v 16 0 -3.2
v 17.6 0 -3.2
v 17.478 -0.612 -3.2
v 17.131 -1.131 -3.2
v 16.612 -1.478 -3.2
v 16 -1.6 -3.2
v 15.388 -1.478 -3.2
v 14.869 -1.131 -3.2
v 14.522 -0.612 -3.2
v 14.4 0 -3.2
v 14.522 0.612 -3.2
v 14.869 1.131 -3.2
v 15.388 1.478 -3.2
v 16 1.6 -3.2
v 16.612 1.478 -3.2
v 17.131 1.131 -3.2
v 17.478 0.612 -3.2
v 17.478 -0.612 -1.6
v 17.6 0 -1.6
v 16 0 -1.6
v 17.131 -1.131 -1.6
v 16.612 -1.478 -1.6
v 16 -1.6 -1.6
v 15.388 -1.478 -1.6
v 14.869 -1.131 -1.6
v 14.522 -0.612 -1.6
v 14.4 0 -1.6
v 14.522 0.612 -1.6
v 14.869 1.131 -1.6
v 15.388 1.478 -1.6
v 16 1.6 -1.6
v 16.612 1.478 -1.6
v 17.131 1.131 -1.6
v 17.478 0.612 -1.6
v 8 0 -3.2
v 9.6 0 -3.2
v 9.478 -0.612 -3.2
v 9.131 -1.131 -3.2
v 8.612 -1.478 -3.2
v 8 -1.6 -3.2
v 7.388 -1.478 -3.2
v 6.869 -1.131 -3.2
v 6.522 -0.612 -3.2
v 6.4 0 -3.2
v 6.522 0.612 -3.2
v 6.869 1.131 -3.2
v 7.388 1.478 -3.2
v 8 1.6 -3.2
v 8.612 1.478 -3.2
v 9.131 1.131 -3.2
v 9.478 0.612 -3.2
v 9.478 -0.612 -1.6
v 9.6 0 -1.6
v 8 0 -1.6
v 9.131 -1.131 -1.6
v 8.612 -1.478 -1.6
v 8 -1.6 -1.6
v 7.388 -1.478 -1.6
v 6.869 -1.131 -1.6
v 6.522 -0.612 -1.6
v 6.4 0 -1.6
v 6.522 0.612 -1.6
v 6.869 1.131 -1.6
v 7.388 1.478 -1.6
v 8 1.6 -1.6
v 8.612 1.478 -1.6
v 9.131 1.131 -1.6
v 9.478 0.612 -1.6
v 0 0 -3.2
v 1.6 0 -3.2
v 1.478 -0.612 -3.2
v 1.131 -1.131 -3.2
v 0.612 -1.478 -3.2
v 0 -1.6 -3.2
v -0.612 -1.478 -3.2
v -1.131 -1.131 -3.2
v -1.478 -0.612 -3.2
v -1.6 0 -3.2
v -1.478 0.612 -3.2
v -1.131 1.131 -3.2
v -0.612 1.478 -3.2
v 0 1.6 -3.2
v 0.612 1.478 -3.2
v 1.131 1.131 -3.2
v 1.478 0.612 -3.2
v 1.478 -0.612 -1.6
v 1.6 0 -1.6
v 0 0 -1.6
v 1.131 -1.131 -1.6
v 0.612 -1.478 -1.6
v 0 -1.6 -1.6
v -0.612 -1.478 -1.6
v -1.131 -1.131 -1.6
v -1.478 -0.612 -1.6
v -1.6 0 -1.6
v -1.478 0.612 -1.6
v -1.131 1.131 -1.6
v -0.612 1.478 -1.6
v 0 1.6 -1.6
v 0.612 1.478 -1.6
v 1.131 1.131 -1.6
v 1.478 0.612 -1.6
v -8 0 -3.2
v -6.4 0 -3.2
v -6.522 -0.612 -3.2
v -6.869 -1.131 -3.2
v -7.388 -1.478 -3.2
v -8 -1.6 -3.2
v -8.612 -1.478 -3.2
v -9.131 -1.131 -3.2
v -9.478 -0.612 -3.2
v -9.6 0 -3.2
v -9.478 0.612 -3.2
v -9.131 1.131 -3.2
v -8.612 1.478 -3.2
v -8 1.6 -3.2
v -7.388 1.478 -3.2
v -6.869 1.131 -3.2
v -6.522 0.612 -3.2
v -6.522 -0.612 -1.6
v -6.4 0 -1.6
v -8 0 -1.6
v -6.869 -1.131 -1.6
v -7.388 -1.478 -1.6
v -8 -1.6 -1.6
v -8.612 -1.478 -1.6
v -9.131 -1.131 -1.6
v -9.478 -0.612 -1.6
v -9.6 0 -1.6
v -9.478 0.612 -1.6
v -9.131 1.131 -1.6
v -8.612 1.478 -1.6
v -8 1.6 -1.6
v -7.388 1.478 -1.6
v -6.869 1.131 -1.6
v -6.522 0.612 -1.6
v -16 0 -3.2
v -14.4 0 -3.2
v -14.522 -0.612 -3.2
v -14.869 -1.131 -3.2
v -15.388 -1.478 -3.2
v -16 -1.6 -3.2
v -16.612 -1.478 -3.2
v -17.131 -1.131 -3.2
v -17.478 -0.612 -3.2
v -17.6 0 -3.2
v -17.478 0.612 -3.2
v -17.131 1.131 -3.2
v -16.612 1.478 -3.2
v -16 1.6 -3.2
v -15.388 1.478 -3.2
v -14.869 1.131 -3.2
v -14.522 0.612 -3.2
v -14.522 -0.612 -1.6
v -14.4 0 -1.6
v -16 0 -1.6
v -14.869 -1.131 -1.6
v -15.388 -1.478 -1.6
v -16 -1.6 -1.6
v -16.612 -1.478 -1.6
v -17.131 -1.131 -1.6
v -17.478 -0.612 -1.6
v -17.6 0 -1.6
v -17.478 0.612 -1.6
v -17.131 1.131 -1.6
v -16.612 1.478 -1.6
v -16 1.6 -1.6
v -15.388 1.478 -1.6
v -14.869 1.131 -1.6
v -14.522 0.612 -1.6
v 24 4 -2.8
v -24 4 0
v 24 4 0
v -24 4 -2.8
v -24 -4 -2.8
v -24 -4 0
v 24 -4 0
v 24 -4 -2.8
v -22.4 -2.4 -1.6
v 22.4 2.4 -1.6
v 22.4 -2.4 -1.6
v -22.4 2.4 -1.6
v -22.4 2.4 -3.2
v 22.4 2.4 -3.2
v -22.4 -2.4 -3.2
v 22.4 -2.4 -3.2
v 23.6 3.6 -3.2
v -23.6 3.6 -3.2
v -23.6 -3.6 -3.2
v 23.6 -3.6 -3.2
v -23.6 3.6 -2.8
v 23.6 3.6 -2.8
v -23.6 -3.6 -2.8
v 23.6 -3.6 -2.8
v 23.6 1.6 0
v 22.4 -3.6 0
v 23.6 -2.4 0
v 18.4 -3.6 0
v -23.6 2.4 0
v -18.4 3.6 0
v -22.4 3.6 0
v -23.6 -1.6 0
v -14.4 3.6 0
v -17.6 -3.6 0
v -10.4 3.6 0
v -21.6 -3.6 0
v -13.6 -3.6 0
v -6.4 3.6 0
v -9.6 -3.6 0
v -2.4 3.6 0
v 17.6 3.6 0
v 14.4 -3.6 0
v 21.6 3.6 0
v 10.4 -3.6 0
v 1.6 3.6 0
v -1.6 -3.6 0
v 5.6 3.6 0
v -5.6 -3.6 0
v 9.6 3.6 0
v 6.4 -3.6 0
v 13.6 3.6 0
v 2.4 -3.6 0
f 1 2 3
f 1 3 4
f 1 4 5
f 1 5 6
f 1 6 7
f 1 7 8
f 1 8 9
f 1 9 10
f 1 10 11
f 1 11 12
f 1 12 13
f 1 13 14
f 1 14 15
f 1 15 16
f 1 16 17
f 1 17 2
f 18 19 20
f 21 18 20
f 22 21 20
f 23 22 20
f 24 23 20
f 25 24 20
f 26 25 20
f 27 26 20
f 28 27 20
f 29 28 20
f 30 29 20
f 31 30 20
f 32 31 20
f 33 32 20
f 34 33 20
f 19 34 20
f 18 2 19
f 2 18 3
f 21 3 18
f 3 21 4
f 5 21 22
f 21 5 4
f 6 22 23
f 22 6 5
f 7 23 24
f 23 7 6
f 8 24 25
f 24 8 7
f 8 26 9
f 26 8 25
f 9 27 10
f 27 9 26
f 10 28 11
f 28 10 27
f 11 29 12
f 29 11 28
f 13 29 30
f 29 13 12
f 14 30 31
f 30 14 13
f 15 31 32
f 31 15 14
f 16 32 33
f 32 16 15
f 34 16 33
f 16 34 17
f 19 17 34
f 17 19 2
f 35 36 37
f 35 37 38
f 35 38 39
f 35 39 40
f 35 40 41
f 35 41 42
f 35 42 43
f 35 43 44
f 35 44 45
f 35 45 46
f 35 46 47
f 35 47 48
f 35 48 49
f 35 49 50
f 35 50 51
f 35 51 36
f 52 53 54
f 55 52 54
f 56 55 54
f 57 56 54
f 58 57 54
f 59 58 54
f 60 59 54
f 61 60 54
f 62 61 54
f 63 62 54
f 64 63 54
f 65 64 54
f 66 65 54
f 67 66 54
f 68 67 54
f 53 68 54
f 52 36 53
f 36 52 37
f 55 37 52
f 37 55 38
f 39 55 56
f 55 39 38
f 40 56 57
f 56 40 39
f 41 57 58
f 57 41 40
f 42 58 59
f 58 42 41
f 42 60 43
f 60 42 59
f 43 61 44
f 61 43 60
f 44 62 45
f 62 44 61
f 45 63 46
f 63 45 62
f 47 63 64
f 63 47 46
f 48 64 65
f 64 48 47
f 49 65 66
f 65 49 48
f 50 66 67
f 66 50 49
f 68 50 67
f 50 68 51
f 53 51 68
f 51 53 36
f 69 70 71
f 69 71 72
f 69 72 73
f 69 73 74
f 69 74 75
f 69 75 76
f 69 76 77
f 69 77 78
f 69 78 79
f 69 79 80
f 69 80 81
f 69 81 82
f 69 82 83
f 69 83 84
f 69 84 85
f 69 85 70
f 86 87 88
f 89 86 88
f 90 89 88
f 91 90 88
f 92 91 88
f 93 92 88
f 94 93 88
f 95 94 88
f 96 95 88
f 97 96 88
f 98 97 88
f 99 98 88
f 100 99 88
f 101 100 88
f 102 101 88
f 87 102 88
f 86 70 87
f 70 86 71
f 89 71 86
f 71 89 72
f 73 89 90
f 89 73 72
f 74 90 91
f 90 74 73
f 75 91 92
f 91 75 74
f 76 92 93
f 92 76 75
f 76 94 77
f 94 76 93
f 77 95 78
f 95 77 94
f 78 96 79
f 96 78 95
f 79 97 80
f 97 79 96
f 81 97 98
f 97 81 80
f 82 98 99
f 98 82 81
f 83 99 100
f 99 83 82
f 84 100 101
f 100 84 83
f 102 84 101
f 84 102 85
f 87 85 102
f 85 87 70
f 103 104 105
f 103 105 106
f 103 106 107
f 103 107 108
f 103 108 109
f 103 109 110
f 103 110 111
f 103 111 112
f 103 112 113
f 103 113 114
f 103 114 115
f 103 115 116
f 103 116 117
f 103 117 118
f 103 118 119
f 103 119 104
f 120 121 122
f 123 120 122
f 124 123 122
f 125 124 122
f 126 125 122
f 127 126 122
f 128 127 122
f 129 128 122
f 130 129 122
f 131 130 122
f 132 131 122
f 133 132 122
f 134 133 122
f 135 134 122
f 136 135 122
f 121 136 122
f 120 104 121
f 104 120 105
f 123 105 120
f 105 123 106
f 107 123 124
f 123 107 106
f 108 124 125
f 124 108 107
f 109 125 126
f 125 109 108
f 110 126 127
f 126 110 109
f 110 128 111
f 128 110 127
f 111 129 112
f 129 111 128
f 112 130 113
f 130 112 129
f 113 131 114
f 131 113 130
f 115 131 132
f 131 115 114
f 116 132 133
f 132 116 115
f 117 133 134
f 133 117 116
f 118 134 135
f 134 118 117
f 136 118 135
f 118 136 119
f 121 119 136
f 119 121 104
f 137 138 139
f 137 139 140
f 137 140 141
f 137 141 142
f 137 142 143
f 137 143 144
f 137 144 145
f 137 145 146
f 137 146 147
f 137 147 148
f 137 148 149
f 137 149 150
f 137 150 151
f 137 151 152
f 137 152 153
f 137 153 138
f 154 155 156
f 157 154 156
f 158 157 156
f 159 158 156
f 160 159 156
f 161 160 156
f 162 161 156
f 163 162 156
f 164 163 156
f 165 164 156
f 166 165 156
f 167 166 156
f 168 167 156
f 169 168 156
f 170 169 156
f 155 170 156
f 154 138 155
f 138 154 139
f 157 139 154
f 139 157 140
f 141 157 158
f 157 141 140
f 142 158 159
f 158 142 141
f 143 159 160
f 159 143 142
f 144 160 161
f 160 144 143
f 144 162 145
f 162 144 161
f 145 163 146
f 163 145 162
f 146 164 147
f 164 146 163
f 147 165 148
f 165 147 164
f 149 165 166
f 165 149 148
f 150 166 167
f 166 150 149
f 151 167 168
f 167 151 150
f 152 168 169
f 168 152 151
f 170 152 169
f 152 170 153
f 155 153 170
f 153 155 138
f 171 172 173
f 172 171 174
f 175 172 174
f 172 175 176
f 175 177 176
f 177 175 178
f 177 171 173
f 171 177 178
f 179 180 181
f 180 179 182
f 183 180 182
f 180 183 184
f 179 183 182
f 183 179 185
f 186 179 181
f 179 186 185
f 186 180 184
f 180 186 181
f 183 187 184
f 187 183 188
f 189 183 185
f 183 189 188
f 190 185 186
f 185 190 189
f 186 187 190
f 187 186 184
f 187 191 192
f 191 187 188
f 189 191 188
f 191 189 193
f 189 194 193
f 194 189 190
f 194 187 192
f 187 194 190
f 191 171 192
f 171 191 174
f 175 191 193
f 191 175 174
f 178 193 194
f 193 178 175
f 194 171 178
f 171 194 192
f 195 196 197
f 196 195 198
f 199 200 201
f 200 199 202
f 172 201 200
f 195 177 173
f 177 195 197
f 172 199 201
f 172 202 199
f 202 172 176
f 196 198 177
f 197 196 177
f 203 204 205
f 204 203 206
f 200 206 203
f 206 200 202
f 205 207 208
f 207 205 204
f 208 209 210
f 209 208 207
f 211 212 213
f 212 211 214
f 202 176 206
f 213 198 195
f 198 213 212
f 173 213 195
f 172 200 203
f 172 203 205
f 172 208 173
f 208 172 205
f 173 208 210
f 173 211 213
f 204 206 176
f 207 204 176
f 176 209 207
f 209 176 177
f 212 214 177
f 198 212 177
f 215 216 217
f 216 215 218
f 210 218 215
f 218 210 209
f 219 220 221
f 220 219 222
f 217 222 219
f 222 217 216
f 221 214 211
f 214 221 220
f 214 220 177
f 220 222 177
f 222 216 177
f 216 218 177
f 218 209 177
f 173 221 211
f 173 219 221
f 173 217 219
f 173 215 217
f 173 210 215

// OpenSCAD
// file: ../p/4-4edge.scad
use <../lib.scad>
function ldraw_lib__4_4edge() = [
// 0 Circle 1.0
// 0 Name: 4-4edge.dat
// 0 Author: James Jessiman
// 0 !LDRAW_ORG Primitive UPDATE 2017-01
// 0 !LICENSE Licensed under CC BY 2.0 and CC BY 4.0 : see CAreadme.txt
// 
// 0 BFC CERTIFY CCW
  [0,"BFC","CERTIFY"],
  [0,"BFC","CCW"],
// 
// 0 !HISTORY 1998-12-15 [PTadmin] Official Update 1998-10
// 0 !HISTORY 2005-12-28 [PTadmin] Official Update 2005-01
// 0 !HISTORY 2007-06-24 [PTadmin] Header formatted for Contributor Agreement
// 0 !HISTORY 2008-07-01 [PTadmin] Official Update 2008-01
// 0 !HISTORY 2017-01-15 [Steffen] BFCed
// 0 !HISTORY 2017-12-30 [PTadmin] Official Update 2017-01
// 
// 
// 2 24 1 0 0 0.9239 0 0.3827
  [2,24,1,0,0,0.9239,0,0.3827],
// 2 24 0.9239 0 0.3827 0.7071 0 0.7071
  [2,24,0.9239,0,0.3827,0.7071,0,0.7071],
// 2 24 0.7071 0 0.7071 0.3827 0 0.9239
  [2,24,0.7071,0,0.7071,0.3827,0,0.9239],
// 2 24 0.3827 0 0.9239 0 0 1
  [2,24,0.3827,0,0.9239,0,0,1],
// 2 24 0 0 1 -0.3827 0 0.9239
  [2,24,0,0,1,-0.3827,0,0.9239],
// 2 24 -0.3827 0 0.9239 -0.7071 0 0.7071
  [2,24,-0.3827,0,0.9239,-0.7071,0,0.7071],
// 2 24 -0.7071 0 0.7071 -0.9239 0 0.3827
  [2,24,-0.7071,0,0.7071,-0.9239,0,0.3827],
// 2 24 -0.9239 0 0.3827 -1 0 -0
  [2,24,-0.9239,0,0.3827,-1,0,-0],
// 2 24 -1 0 -0 -0.9239 0 -0.3827
  [2,24,-1,0,-0,-0.9239,0,-0.3827],
// 2 24 -0.9239 0 -0.3827 -0.7071 0 -0.7071
  [2,24,-0.9239,0,-0.3827,-0.7071,0,-0.7071],
// 2 24 -0.7071 0 -0.7071 -0.3827 0 -0.9239
  [2,24,-0.7071,0,-0.7071,-0.3827,0,-0.9239],
// 2 24 -0.3827 0 -0.9239 0 0 -1
  [2,24,-0.3827,0,-0.9239,0,0,-1],
// 2 24 0 0 -1 0.3827 0 -0.9239
  [2,24,0,0,-1,0.3827,0,-0.9239],
// 2 24 0.3827 0 -0.9239 0.7071 0 -0.7071
  [2,24,0.3827,0,-0.9239,0.7071,0,-0.7071],
// 2 24 0.7071 0 -0.7071 0.9239 0 -0.3827
  [2,24,0.7071,0,-0.7071,0.9239,0,-0.3827],
// 2 24 0.9239 0 -0.3827 1 0 0
  [2,24,0.9239,0,-0.3827,1,0,0],
];
module ldraw_lib__4_4edge(step=0, col=false, unit=2/5, alt=false, line=0.2, solid=!$preview)
    makepoly(ldraw_lib__4_4edge(), step=step, col=col, unit=unit, alt=alt, line=line, solid=solid);
ldraw_lib__4_4edge(line=0.2);
// file: ../p/4-4disc.scad
use <../lib.scad>
function ldraw_lib__4_4disc() = [
// 0 Disc 1.0
// 0 Name: 4-4disc.dat
// 0 Author: James Jessiman
// 0 !LDRAW_ORG Primitive UPDATE 2002-02
// 0 !LICENSE Licensed under CC BY 2.0 and CC BY 4.0 : see CAreadme.txt
// 
// 0 BFC CERTIFY CCW
  [0,"BFC","CERTIFY"],
  [0,"BFC","CCW"],
// 
// 0 !HISTORY 1998-12-15 [PTadmin] Official Update 1998-10
// 0 !HISTORY 2002-03-23 [sbliss] Added BFC statement
// 0 !HISTORY 2002-04-25 [PTadmin] Official Update 2002-02
// 0 !HISTORY 2007-06-24 [PTadmin] Header formatted for Contributor Agreement
// 0 !HISTORY 2008-07-01 [PTadmin] Official Update 2008-01
// 
// 
// 3 16 0 0 0 1 0 0 0.9239 0 0.3827
  [3,16,0,0,0,1,0,0,0.9239,0,0.3827],
// 3 16 0 0 0 0.9239 0 0.3827 0.7071 0 0.7071
  [3,16,0,0,0,0.9239,0,0.3827,0.7071,0,0.7071],
// 3 16 0 0 0 0.7071 0 0.7071 0.3827 0 0.9239
  [3,16,0,0,0,0.7071,0,0.7071,0.3827,0,0.9239],
// 3 16 0 0 0 0.3827 0 0.9239 0 0 1
  [3,16,0,0,0,0.3827,0,0.9239,0,0,1],
// 3 16 0 0 0 0 0 1 -0.3827 0 0.9239
  [3,16,0,0,0,0,0,1,-0.3827,0,0.9239],
// 3 16 0 0 0 -0.3827 0 0.9239 -0.7071 0 0.7071
  [3,16,0,0,0,-0.3827,0,0.9239,-0.7071,0,0.7071],
// 3 16 0 0 0 -0.7071 0 0.7071 -0.9239 0 0.3827
  [3,16,0,0,0,-0.7071,0,0.7071,-0.9239,0,0.3827],
// 3 16 0 0 0 -0.9239 0 0.3827 -1 0 -0
  [3,16,0,0,0,-0.9239,0,0.3827,-1,0,-0],
// 3 16 0 0 0 -1 0 -0 -0.9239 0 -0.3827
  [3,16,0,0,0,-1,0,-0,-0.9239,0,-0.3827],
// 3 16 0 0 0 -0.9239 0 -0.3827 -0.7071 0 -0.7071
  [3,16,0,0,0,-0.9239,0,-0.3827,-0.7071,0,-0.7071],
// 3 16 0 0 0 -0.7071 0 -0.7071 -0.3827 0 -0.9239
  [3,16,0,0,0,-0.7071,0,-0.7071,-0.3827,0,-0.9239],
// 3 16 0 0 0 -0.3827 0 -0.9239 0 0 -1
  [3,16,0,0,0,-0.3827,0,-0.9239,0,0,-1],
// 3 16 0 0 0 0 0 -1 0.3827 0 -0.9239
  [3,16,0,0,0,0,0,-1,0.3827,0,-0.9239],
// 3 16 0 0 0 0.3827 0 -0.9239 0.7071 0 -0.7071
  [3,16,0,0,0,0.3827,0,-0.9239,0.7071,0,-0.7071],
// 3 16 0 0 0 0.7071 0 -0.7071 0.9239 0 -0.3827
  [3,16,0,0,0,0.7071,0,-0.7071,0.9239,0,-0.3827],
// 3 16 0 0 0 0.9239 0 -0.3827 1 0 0
  [3,16,0,0,0,0.9239,0,-0.3827,1,0,0],
// 0
];
module ldraw_lib__4_4disc(step=0, col=false, unit=2/5, alt=false, line=0.2, solid=!$preview)
    makepoly(ldraw_lib__4_4disc(), step=step, col=col, unit=unit, alt=alt, line=line, solid=solid);
ldraw_lib__4_4disc(line=0.2);
// file: ../p/4-4cyli.scad
use <../lib.scad>
$fa=1; $fs=0.2;
function ldraw_lib__4_4cyli(realsolid=false) = [
// 0 Cylinder 1.0
// 0 Name: 4-4cyli.dat
// 0 Author: James Jessiman
// 0 !LDRAW_ORG Primitive UPDATE 2005-01
// 0 !LICENSE Licensed under CC BY 2.0 and CC BY 4.0 : see CAreadme.txt
// 
// 0 BFC CERTIFY CCW
  [0,"BFC","CERTIFY"],
  [0,"BFC","CCW"],
// 
// 0 !HISTORY 1998-12-15 [PTadmin] Official Update 1998-10
// 0 !HISTORY 2002-03-23 [sbliss] Added BFC statement; merged headers from files in distributions LDraw 0.27 and Complete.
// 0 !HISTORY 2002-04-25 [PTadmin] Official Update 2002-02
// 0 !HISTORY 2004-12-14 [guyvivan] BFC CCW
// 0 !HISTORY 2005-12-28 [PTadmin] Official Update 2005-01
// 0 !HISTORY 2007-06-24 [PTadmin] Header formatted for Contributor Agreement
// 0 !HISTORY 2008-07-01 [PTadmin] Official Update 2008-01
// 
// 
// 4 16 1 1 0 0.9239 1 0.3827 0.9239 0 0.3827 1 0 0
  [4,16,1,1,0,0.9239,1,0.3827,0.9239,0,0.3827,1,0,0],
// 5 24 1 0 0 1 1 0 0.9239 0 0.3827 0.9239 0 -0.3827
  [5,24,1,0,0,1,1,0,0.9239,0,0.3827,0.9239,0,-0.3827],
// 4 16 0.9239 1 0.3827 0.7071 1 0.7071 0.7071 0 0.7071 0.9239 0 0.3827
  [4,16,0.9239,1,0.3827,0.7071,1,0.7071,0.7071,0,0.7071,0.9239,0,0.3827],
// 5 24 0.9239 0 0.3827 0.9239 1 0.3827 0.7071 0 0.7071 1 0 0
  [5,24,0.9239,0,0.3827,0.9239,1,0.3827,0.7071,0,0.7071,1,0,0],
// 4 16 0.7071 1 0.7071 0.3827 1 0.9239 0.3827 0 0.9239 0.7071 0 0.7071
  [4,16,0.7071,1,0.7071,0.3827,1,0.9239,0.3827,0,0.9239,0.7071,0,0.7071],
// 5 24 0.7071 0 0.7071 0.7071 1 0.7071 0.3827 0 0.9239 0.9239 0 0.3827
  [5,24,0.7071,0,0.7071,0.7071,1,0.7071,0.3827,0,0.9239,0.9239,0,0.3827],
// 4 16 0.3827 1 0.9239 0 1 1 0 0 1 0.3827 0 0.9239
  [4,16,0.3827,1,0.9239,0,1,1,0,0,1,0.3827,0,0.9239],
// 5 24 0.3827 0 0.9239 0.3827 1 0.9239 0 0 1 0.7071 0 0.7071
  [5,24,0.3827,0,0.9239,0.3827,1,0.9239,0,0,1,0.7071,0,0.7071],
// 4 16 0 1 1 -0.3827 1 0.9239 -0.3827 0 0.9239 0 0 1
  [4,16,0,1,1,-0.3827,1,0.9239,-0.3827,0,0.9239,0,0,1],
// 5 24 0 0 1 0 1 1 -0.3827 0 0.9239 0.3827 0 0.9239
  [5,24,0,0,1,0,1,1,-0.3827,0,0.9239,0.3827,0,0.9239],
// 4 16 -0.3827 1 0.9239 -0.7071 1 0.7071 -0.7071 0 0.7071 -0.3827 0 0.9239
  [4,16,-0.3827,1,0.9239,-0.7071,1,0.7071,-0.7071,0,0.7071,-0.3827,0,0.9239],
// 5 24 -0.3827 0 0.9239 -0.3827 1 0.9239 -0.7071 0 0.7071 0 0 1
  [5,24,-0.3827,0,0.9239,-0.3827,1,0.9239,-0.7071,0,0.7071,0,0,1],
// 4 16 -0.7071 1 0.7071 -0.9239 1 0.3827 -0.9239 0 0.3827 -0.7071 0 0.7071
  [4,16,-0.7071,1,0.7071,-0.9239,1,0.3827,-0.9239,0,0.3827,-0.7071,0,0.7071],
// 5 24 -0.7071 0 0.7071 -0.7071 1 0.7071 -0.9239 0 0.3827 -0.3827 0 0.9239
  [5,24,-0.7071,0,0.7071,-0.7071,1,0.7071,-0.9239,0,0.3827,-0.3827,0,0.9239],
// 4 16 -0.9239 1 0.3827 -1 1 0 -1 0 0 -0.9239 0 0.3827
  [4,16,-0.9239,1,0.3827,-1,1,0,-1,0,0,-0.9239,0,0.3827],
// 5 24 -0.9239 0 0.3827 -0.9239 1 0.3827 -1 0 0 -0.7071 0 0.7071
  [5,24,-0.9239,0,0.3827,-0.9239,1,0.3827,-1,0,0,-0.7071,0,0.7071],
// 4 16 -1 1 0 -0.9239 1 -0.3827 -0.9239 0 -0.3827 -1 0 0
  [4,16,-1,1,0,-0.9239,1,-0.3827,-0.9239,0,-0.3827,-1,0,0],
// 5 24 -1 0 0 -1 1 0 -0.9239 0 -0.3827 -0.9239 0 0.3827
  [5,24,-1,0,0,-1,1,0,-0.9239,0,-0.3827,-0.9239,0,0.3827],
// 4 16 -0.9239 1 -0.3827 -0.7071 1 -0.7071 -0.7071 0 -0.7071 -0.9239 0 -0.3827
  [4,16,-0.9239,1,-0.3827,-0.7071,1,-0.7071,-0.7071,0,-0.7071,-0.9239,0,-0.3827],
// 5 24 -0.9239 0 -0.3827 -0.9239 1 -0.3827 -0.7071 0 -0.7071 -1 0 0
  [5,24,-0.9239,0,-0.3827,-0.9239,1,-0.3827,-0.7071,0,-0.7071,-1,0,0],
// 4 16 -0.7071 1 -0.7071 -0.3827 1 -0.9239 -0.3827 0 -0.9239 -0.7071 0 -0.7071
  [4,16,-0.7071,1,-0.7071,-0.3827,1,-0.9239,-0.3827,0,-0.9239,-0.7071,0,-0.7071],
// 5 24 -0.7071 0 -0.7071 -0.7071 1 -0.7071 -0.3827 0 -0.9239 -0.9239 0 -0.3827
  [5,24,-0.7071,0,-0.7071,-0.7071,1,-0.7071,-0.3827,0,-0.9239,-0.9239,0,-0.3827],
// 4 16 -0.3827 1 -0.9239 0 1 -1 0 0 -1 -0.3827 0 -0.9239
  [4,16,-0.3827,1,-0.9239,0,1,-1,0,0,-1,-0.3827,0,-0.9239],
// 5 24 -0.3827 0 -0.9239 -0.3827 1 -0.9239 0 0 -1 -0.7071 0 -0.7071
  [5,24,-0.3827,0,-0.9239,-0.3827,1,-0.9239,0,0,-1,-0.7071,0,-0.7071],
// 4 16 0 1 -1 0.3827 1 -0.9239 0.3827 0 -0.9239 0 0 -1
  [4,16,0,1,-1,0.3827,1,-0.9239,0.3827,0,-0.9239,0,0,-1],
// 5 24 0 0 -1 0 1 -1 0.3827 0 -0.9239 -0.3827 0 -0.9239
  [5,24,0,0,-1,0,1,-1,0.3827,0,-0.9239,-0.3827,0,-0.9239],
// 4 16 0.3827 1 -0.9239 0.7071 1 -0.7071 0.7071 0 -0.7071 0.3827 0 -0.9239
  [4,16,0.3827,1,-0.9239,0.7071,1,-0.7071,0.7071,0,-0.7071,0.3827,0,-0.9239],
// 5 24 0.3827 0 -0.9239 0.3827 1 -0.9239 0.7071 0 -0.7071 0 0 -1
  [5,24,0.3827,0,-0.9239,0.3827,1,-0.9239,0.7071,0,-0.7071,0,0,-1],
// 4 16 0.7071 1 -0.7071 0.9239 1 -0.3827 0.9239 0 -0.3827 0.7071 0 -0.7071
  [4,16,0.7071,1,-0.7071,0.9239,1,-0.3827,0.9239,0,-0.3827,0.7071,0,-0.7071],
// 5 24 0.7071 0 -0.7071 0.7071 1 -0.7071 0.9239 0 -0.3827 0.3827 0 -0.9239
  [5,24,0.7071,0,-0.7071,0.7071,1,-0.7071,0.9239,0,-0.3827,0.3827,0,-0.9239],
// 4 16 0.9239 1 -0.3827 1 1 0 1 0 0 0.9239 0 -0.3827
  [4,16,0.9239,1,-0.3827,1,1,0,1,0,0,0.9239,0,-0.3827],
// 5 24 0.9239 0 -0.3827 0.9239 1 -0.3827 1 0 0 0.7071 0 -0.7071
  [5,24,0.9239,0,-0.3827,0.9239,1,-0.3827,1,0,0,0.7071,0,-0.7071],
// 0
];
module ldraw_lib__4_4cyli(step=0, col=false, unit=2/5, alt=false, line=0.2, solid=!$preview)
    makepoly(ldraw_lib__4_4cyli(solid), step=step, col=col, unit=unit, alt=alt, line=line, solid=solid);
ldraw_lib__4_4cyli(line=0.2);
// file: ../p/stud3.scad
use <../lib.scad>
use <4-4cyli.scad>
use <4-4disc.scad>
use <4-4edge.scad>
function ldraw_lib__stud3() = [
// 0 Stud Tube Solid
// 0 Name: stud3.dat
// 0 Author: James Jessiman
// 0 !LDRAW_ORG Primitive UPDATE 2012-01
// 0 !LICENSE Licensed under CC BY 4.0 : see CAreadme.txt
// 
// 0 BFC CERTIFY CCW
  [0,"BFC","CERTIFY"],
  [0,"BFC","CCW"],
// 
// 0 !HISTORY 2002-04-04 [sbliss] Modified for BFC compliance
// 0 !HISTORY 2002-04-25 [PTadmin] Official Update 2002-02
// 0 !HISTORY 2007-06-24 [PTadmin] Header formatted for Contributor Agreement
// 0 !HISTORY 2008-07-01 [PTadmin] Official Update 2008-01
// 0 !HISTORY 2012-02-16 [Philo] Changed to CCW
// 0 !HISTORY 2012-03-30 [PTadmin] Official Update 2012-01
// 
// 
// 1 16 0 -4 0 4 0 0 0 1 0 0 0 4 4-4edge.dat
  [1,16,0,-4,0,4,0,0,0,1,0,0,0,4, ldraw_lib__4_4edge()],
// 1 16 0 0 0 4 0 0 0 1 0 0 0 4 4-4edge.dat
  [1,16,0,0,0,4,0,0,0,1,0,0,0,4, ldraw_lib__4_4edge()],
// 1 16 0 -4 0 4 0 0 0 1 0 0 0 4 4-4disc.dat
  [1,16,0,-4,0,4,0,0,0,1,0,0,0,4, ldraw_lib__4_4disc()],
  [-1,16,0,0,0,4,0,0,0,-1,0,0,0,4, ldraw_lib__4_4disc()],
// 1 16 0 -4 0 4 0 0 0 4 0 0 0 4 4-4cyli.dat
  [1,16,0,-4,0,4,0,0,0,4,0,0,0,4, ldraw_lib__4_4cyli()],
];
module ldraw_lib__stud3(step=0, col=false, unit=2/5, alt=false, line=0.2, solid=!$preview)
    makepoly(ldraw_lib__stud3(), step=step, col=col, unit=unit, alt=alt, line=line, solid=solid);
ldraw_lib__stud3(line=0.2);
// file: ../p/box5.scad
use <../lib.scad>
function ldraw_lib__box5() = [
// 0 Box with 5 Faces and All Edges
// 0 Name: box5.dat
// 0 Author: James Jessiman
// 0 !LDRAW_ORG Primitive UPDATE 2012-01
// 0 !LICENSE Licensed under CC BY 2.0 and CC BY 4.0 : see CAreadme.txt
// 
// 0 BFC CERTIFY CCW
  [0,"BFC","CERTIFY"],
  [0,"BFC","CCW"],
// 
// 0 !HISTORY 2002-04-03 [sbliss] Modified for BFC compliance
// 0 !HISTORY 2002-04-25 [PTadmin] Official Update 2002-02
// 0 !HISTORY 2007-06-24 [PTadmin] Header formatted for Contributor Agreement
// 0 !HISTORY 2008-07-01 [PTadmin] Official Update 2008-01
// 0 !HISTORY 2012-02-16 [Philo] Changed to CCW
// 0 !HISTORY 2012-03-30 [PTadmin] Official Update 2012-01
// 
// 
// 2 24 1 1 1 -1 1 1
  [2,24,1,1,1,-1,1,1],
// 2 24 -1 1 1 -1 1 -1
  [2,24,-1,1,1,-1,1,-1],
// 2 24 -1 1 -1 1 1 -1
  [2,24,-1,1,-1,1,1,-1],
// 2 24 1 1 -1 1 1 1
  [2,24,1,1,-1,1,1,1],
// 2 24 1 0 1 -1 0 1
  [2,24,1,0,1,-1,0,1],
// 2 24 -1 0 1 -1 0 -1
  [2,24,-1,0,1,-1,0,-1],
// 2 24 -1 0 -1 1 0 -1
  [2,24,-1,0,-1,1,0,-1],
// 2 24 1 0 -1 1 0 1
  [2,24,1,0,-1,1,0,1],
// 2 24 1 0 1 1 1 1
  [2,24,1,0,1,1,1,1],
// 2 24 -1 0 1 -1 1 1
  [2,24,-1,0,1,-1,1,1],
// 2 24 1 0 -1 1 1 -1
  [2,24,1,0,-1,1,1,-1],
// 2 24 -1 0 -1 -1 1 -1
  [2,24,-1,0,-1,-1,1,-1],
// 4 16 -1 1 1 1 1 1 1 1 -1 -1 1 -1
  [4,16,-1,1,1,1,1,1,1,1,-1,-1,1,-1],
// 4 16 -1 1 1 -1 0 1 1 0 1 1 1 1
  [4,16,-1,1,1,-1,0,1,1,0,1,1,1,1],
// 4 16 -1 1 -1 -1 0 -1 -1 0 1 -1 1 1
  [4,16,-1,1,-1,-1,0,-1,-1,0,1,-1,1,1],
// 4 16 1 1 -1 1 0 -1 -1 0 -1 -1 1 -1
  [4,16,1,1,-1,1,0,-1,-1,0,-1,-1,1,-1],
// 4 16 1 1 1 1 0 1 1 0 -1 1 1 -1
  [4,16,1,1,1,1,0,1,1,0,-1,1,1,-1],
];
makepoly(ldraw_lib__box5(), line=0.2);
// file: ../p/box4.scad
use <../lib.scad>
function ldraw_lib__box4() = [
// 0 Box with 4 Faces (2 Parallel Pairs) and All Edges
// 0 Name: box4.dat
// 0 Author: James Jessiman
// 0 !LDRAW_ORG Primitive UPDATE 2012-01
// 0 !LICENSE Licensed under CC BY 4.0 : see CAreadme.txt
// 
// 0 BFC CERTIFY CCW
  [0,"BFC","CERTIFY"],
  [0,"BFC","CCW"],
// 
// 0 !HISTORY 2002-04-03 [sbliss] Modified for BFC compliance
// 0 !HISTORY 2002-04-25 [PTadmin] Official Update 2002-02
// 0 !HISTORY 2007-06-24 [PTadmin] Header formatted for Contributor Agreement
// 0 !HISTORY 2008-07-01 [PTadmin] Official Update 2008-01
// 0 !HISTORY 2012-02-16 [Philo] Changed to CCW
// 0 !HISTORY 2012-03-30 [PTadmin] Official Update 2012-01
// 
// 
// 2 24 1 1 1 -1 1 1
  [2,24,1,1,1,-1,1,1],
// 2 24 -1 1 1 -1 1 -1
  [2,24,-1,1,1,-1,1,-1],
// 2 24 -1 1 -1 1 1 -1
  [2,24,-1,1,-1,1,1,-1],
// 2 24 1 1 -1 1 1 1
  [2,24,1,1,-1,1,1,1],
// 2 24 1 0 1 -1 0 1
  [2,24,1,0,1,-1,0,1],
// 2 24 -1 0 1 -1 0 -1
  [2,24,-1,0,1,-1,0,-1],
// 2 24 -1 0 -1 1 0 -1
  [2,24,-1,0,-1,1,0,-1],
// 2 24 1 0 -1 1 0 1
  [2,24,1,0,-1,1,0,1],
// 2 24 1 0 1 1 1 1
  [2,24,1,0,1,1,1,1],
// 2 24 -1 0 1 -1 1 1
  [2,24,-1,0,1,-1,1,1],
// 2 24 1 0 -1 1 1 -1
  [2,24,1,0,-1,1,1,-1],
// 2 24 -1 0 -1 -1 1 -1
  [2,24,-1,0,-1,-1,1,-1],
// 4 16 -1 1 1 -1 0 1 1 0 1 1 1 1
  [4,16,-1,1,1,-1,0,1,1,0,1,1,1,1],
// 4 16 -1 1 -1 -1 0 -1 -1 0 1 -1 1 1
  [4,16,-1,1,-1,-1,0,-1,-1,0,1,-1,1,1],
// 4 16 1 1 -1 1 0 -1 -1 0 -1 -1 1 -1
  [4,16,1,1,-1,1,0,-1,-1,0,-1,-1,1,-1],
// 4 16 1 1 1 1 0 1 1 0 -1 1 1 -1
  [4,16,1,1,1,1,0,1,1,0,-1,1,1,-1],
];
module ldraw_lib__box4(step=0, col=false, unit=2/5, alt=false, line=0.2, solid=!$preview)
    makepoly(ldraw_lib__box4(), step=step, col=col, unit=unit, alt=alt, line=line, solid=solid);
ldraw_lib__box4(line=0.2);
// file: s/6636s01.scad
use <../../lib.scad>
use <../../p/box4.scad>
use <../../p/box5.scad>
use <../../p/stud3.scad>
function ldraw_lib__s__6636s01() = [
// 0 ~Tile  1 x  6 without Top Face
// 0 Name: s\6636s01.dat
// 0 Author: C.L.Rasmussen [johnny-thunder]
// 0 !LDRAW_ORG Subpart UPDATE 2009-03
// 0 !LICENSE Licensed under CC BY 2.0 and CC BY 4.0 : see CAreadme.txt
// 
// 0 BFC CERTIFY CCW
  [0,"BFC","CERTIFY"],
  [0,"BFC","CCW"],
// 
// 0 !HISTORY 2009-12-29 [PTadmin] Official Update 2009-03
// 
// 
// 1 16 40 4 0 1 0 0 0 -1 0 0 0 -1 stud3.dat
  [1,16,40,4,0,1,0,0,0,-1,0,0,0,-1, ldraw_lib__stud3()],
// 1 16 20 4 0 1 0 0 0 -1 0 0 0 -1 stud3.dat
  [1,16,20,4,0,1,0,0,0,-1,0,0,0,-1, ldraw_lib__stud3()],
// 1 16 0 4 0 1 0 0 0 -1 0 0 0 -1 stud3.dat
  [1,16,0,4,0,1,0,0,0,-1,0,0,0,-1, ldraw_lib__stud3()],
// 1 16 -20 4 0 1 0 0 0 -1 0 0 0 -1 stud3.dat
  [1,16,-20,4,0,1,0,0,0,-1,0,0,0,-1, ldraw_lib__stud3()],
// 1 16 -40 4 0 1 0 0 0 -1 0 0 0 -1 stud3.dat
  [1,16,-40,4,0,1,0,0,0,-1,0,0,0,-1, ldraw_lib__stud3()],
// 1 16 0 7 0 60 0 0 0 -7 0 0 0 10 box4.dat
  [1,16,0,7,0,60,0,0,0,-7,0,0,0,10, ldraw_lib__box4()],
// 0 BFC INVERTNEXT
  [0,"BFC","INVERTNEXT"],
// 1 16 0 8 0 56 0 0 0 -4 0 0 0 6 box5.dat
  [1,16,0,8,0,56,0,0,0,-4,0,0,0,6, ldraw_lib__box5()],
// 4 16 59 8 9 56 8 6 -56 8 6 -59 8 9
  [4,16,59,8,9,56,8,6,-56,8,6,-59,8,9],
// 4 16 -59 8 9 -56 8 6 -56 8 -6 -59 8 -9
  [4,16,-59,8,9,-56,8,6,-56,8,-6,-59,8,-9],
// 4 16 -59 8 -9 -56 8 -6 56 8 -6 59 8 -9
  [4,16,-59,8,-9,-56,8,-6,56,8,-6,59,8,-9],
// 4 16 59 8 -9 56 8 -6 56 8 6 59 8 9
  [4,16,59,8,-9,56,8,-6,56,8,6,59,8,9],
// 1 16 0 8 0 59 0 0 0 -1 0 0 0 9 box4.dat
  [1,16,0,8,0,59,0,0,0,-1,0,0,0,9, ldraw_lib__box4()],
// 4 16 60 7 10 59 7 9 -59 7 9 -60 7 10
  [4,16,60,7,10,59,7,9,-59,7,9,-60,7,10],
// 4 16 -60 7 10 -59 7 9 -59 7 -9 -60 7 -10
  [4,16,-60,7,10,-59,7,9,-59,7,-9,-60,7,-10],
// 4 16 -60 7 -10 -59 7 -9 59 7 -9 60 7 -10
  [4,16,-60,7,-10,-59,7,-9,59,7,-9,60,7,-10],
// 4 16 60 7 -10 59 7 -9 59 7 9 60 7 10
  [4,16,60,7,-10,59,7,-9,59,7,9,60,7,10],
// 0
];
makepoly(ldraw_lib__s__6636s01(), line=0.2);
// main file
use <../lib.scad>
use <s/6636s01.scad>
function ldraw_lib__6636p0j() = [
// 0 Tile  1 x  6 with Danger Red Stripes Pattern
// 0 Name: 6636p0j.dat
// 0 Author: Philippe Hurbain [Philo]
// 0 !LDRAW_ORG Part UPDATE 2025-02
// 0 !LICENSE Licensed under CC BY 4.0 : see CAreadme.txt
// 
// 0 BFC CERTIFY CCW
  [0,"BFC","CERTIFY"],
  [0,"BFC","CCW"],
// 
// 0 !KEYWORDS Bricklink 6636pb352, Rebrickable 6636pr9997, Set 60420, Set 60435
// 
// 0 !HISTORY 2024-08-26 [OrionP] Official Update 2024-07
// 0 !HISTORY 2025-02-27 [Lego-Manfred] References added
// 0 !HISTORY 2025-02-27 [OrionP] Official Update 2025-02
// 
// 1 16 0 0 0 1 0 0 0 1 0 0 0 1 s\6636s01.dat
  [1,16,0,0,0,1,0,0,0,1,0,0,0,1, ldraw_lib__s__6636s01()],
// 4 4 56 0 -9 59 0 -6 59 0 4 46 0 -9
  [4,4,56,0,-9,59,0,-6,59,0,4,46,0,-9],
// 4 4 -59 0 -4 -46 0 9 -56 0 9 -59 0 6
  [4,4,-59,0,-4,-46,0,9,-56,0,9,-59,0,6],
// 3 16 -60 0 10 -56 0 9 -46 0 9
  [3,16,-60,0,10,-56,0,9,-46,0,9],
// 4 16 59 0 4 59 0 -6 60 0 -10 60 0 10
  [4,16,59,0,4,59,0,-6,60,0,-10,60,0,10],
// 3 16 -60 0 10 -59 0 6 -56 0 9
  [3,16,-60,0,10,-59,0,6,-56,0,9],
// 4 16 -59 0 -4 -59 0 6 -60 0 10 -60 0 -10
  [4,16,-59,0,-4,-59,0,6,-60,0,10,-60,0,-10],
// 3 16 56 0 -9 46 0 -9 60 0 -10
  [3,16,56,0,-9,46,0,-9,60,0,-10],
// 3 16 59 0 -6 56 0 -9 60 0 -10
  [3,16,59,0,-6,56,0,-9,60,0,-10],
// 4 4 -44 0 -9 -26 0 9 -36 0 9 -54 0 -9
  [4,4,-44,0,-9,-26,0,9,-36,0,9,-54,0,-9],
// 4 16 -54 0 -9 -36 0 9 -46 0 9 -59 0 -4
  [4,16,-54,0,-9,-36,0,9,-46,0,9,-59,0,-4],
// 4 16 -34 0 -9 -16 0 9 -26 0 9 -44 0 -9
  [4,16,-34,0,-9,-16,0,9,-26,0,9,-44,0,-9],
// 4 4 -16 0 9 -34 0 -9 -24 0 -9 -6 0 9
  [4,4,-16,0,9,-34,0,-9,-24,0,-9,-6,0,9],
// 4 4 44 0 9 26 0 -9 36 0 -9 54 0 9
  [4,4,44,0,9,26,0,-9,36,0,-9,54,0,9],
// 3 16 -59 0 -4 -60 0 -10 -54 0 -9
  [3,16,-59,0,-4,-60,0,-10,-54,0,-9],
// 4 16 54 0 9 36 0 -9 46 0 -9 59 0 4
  [4,16,54,0,9,36,0,-9,46,0,-9,59,0,4],
// 3 16 60 0 10 54 0 9 59 0 4
  [3,16,60,0,10,54,0,9,59,0,4],
// 3 16 -60 0 10 -46 0 9 -36 0 9
  [3,16,-60,0,10,-46,0,9,-36,0,9],
// 3 16 -60 0 10 -36 0 9 -26 0 9
  [3,16,-60,0,10,-36,0,9,-26,0,9],
// 4 16 -60 0 10 -26 0 9 -16 0 9 60 0 10
  [4,16,-60,0,10,-26,0,9,-16,0,9,60,0,10],
// 3 16 60 0 10 -16 0 9 -6 0 9
  [3,16,60,0,10,-16,0,9,-6,0,9],
// 3 16 60 0 10 44 0 9 54 0 9
  [3,16,60,0,10,44,0,9,54,0,9],
// 3 16 -44 0 -9 -54 0 -9 -60 0 -10
  [3,16,-44,0,-9,-54,0,-9,-60,0,-10],
// 3 16 -34 0 -9 -44 0 -9 -60 0 -10
  [3,16,-34,0,-9,-44,0,-9,-60,0,-10],
// 4 16 -24 0 -9 -34 0 -9 -60 0 -10 60 0 -10
  [4,16,-24,0,-9,-34,0,-9,-60,0,-10,60,0,-10],
// 3 16 36 0 -9 26 0 -9 60 0 -10
  [3,16,36,0,-9,26,0,-9,60,0,-10],
// 3 16 46 0 -9 36 0 -9 60 0 -10
  [3,16,46,0,-9,36,0,-9,60,0,-10],
// 4 4 -4 0 -9 14 0 9 4 0 9 -14 0 -9
  [4,4,-4,0,-9,14,0,9,4,0,9,-14,0,-9],
// 4 16 -14 0 -9 4 0 9 -6 0 9 -24 0 -9
  [4,16,-14,0,-9,4,0,9,-6,0,9,-24,0,-9],
// 4 4 16 0 -9 34 0 9 24 0 9 6 0 -9
  [4,4,16,0,-9,34,0,9,24,0,9,6,0,-9],
// 4 16 6 0 -9 24 0 9 14 0 9 -4 0 -9
  [4,16,6,0,-9,24,0,9,14,0,9,-4,0,-9],
// 4 16 34 0 9 16 0 -9 26 0 -9 44 0 9
  [4,16,34,0,9,16,0,-9,26,0,-9,44,0,9],
// 3 16 26 0 -9 16 0 -9 60 0 -10
  [3,16,26,0,-9,16,0,-9,60,0,-10],
// 3 16 16 0 -9 6 0 -9 60 0 -10
  [3,16,16,0,-9,6,0,-9,60,0,-10],
// 3 16 6 0 -9 -4 0 -9 60 0 -10
  [3,16,6,0,-9,-4,0,-9,60,0,-10],
// 3 16 -4 0 -9 -14 0 -9 60 0 -10
  [3,16,-4,0,-9,-14,0,-9,60,0,-10],
// 3 16 -14 0 -9 -24 0 -9 60 0 -10
  [3,16,-14,0,-9,-24,0,-9,60,0,-10],
// 3 16 60 0 10 34 0 9 44 0 9
  [3,16,60,0,10,34,0,9,44,0,9],
// 3 16 60 0 10 24 0 9 34 0 9
  [3,16,60,0,10,24,0,9,34,0,9],
// 3 16 60 0 10 14 0 9 24 0 9
  [3,16,60,0,10,14,0,9,24,0,9],
// 3 16 60 0 10 4 0 9 14 0 9
  [3,16,60,0,10,4,0,9,14,0,9],
// 3 16 60 0 10 -6 0 9 4 0 9
  [3,16,60,0,10,-6,0,9,4,0,9],
];
module ldraw_lib__6636p0j(step=0, col=false, unit=2/5, alt=false, line=0.2, solid=!$preview)
    makepoly(ldraw_lib__6636p0j(), step=step, col=col, unit=unit, alt=alt, line=line, solid=solid);
ldraw_lib__6636p0j(line=0.2);
